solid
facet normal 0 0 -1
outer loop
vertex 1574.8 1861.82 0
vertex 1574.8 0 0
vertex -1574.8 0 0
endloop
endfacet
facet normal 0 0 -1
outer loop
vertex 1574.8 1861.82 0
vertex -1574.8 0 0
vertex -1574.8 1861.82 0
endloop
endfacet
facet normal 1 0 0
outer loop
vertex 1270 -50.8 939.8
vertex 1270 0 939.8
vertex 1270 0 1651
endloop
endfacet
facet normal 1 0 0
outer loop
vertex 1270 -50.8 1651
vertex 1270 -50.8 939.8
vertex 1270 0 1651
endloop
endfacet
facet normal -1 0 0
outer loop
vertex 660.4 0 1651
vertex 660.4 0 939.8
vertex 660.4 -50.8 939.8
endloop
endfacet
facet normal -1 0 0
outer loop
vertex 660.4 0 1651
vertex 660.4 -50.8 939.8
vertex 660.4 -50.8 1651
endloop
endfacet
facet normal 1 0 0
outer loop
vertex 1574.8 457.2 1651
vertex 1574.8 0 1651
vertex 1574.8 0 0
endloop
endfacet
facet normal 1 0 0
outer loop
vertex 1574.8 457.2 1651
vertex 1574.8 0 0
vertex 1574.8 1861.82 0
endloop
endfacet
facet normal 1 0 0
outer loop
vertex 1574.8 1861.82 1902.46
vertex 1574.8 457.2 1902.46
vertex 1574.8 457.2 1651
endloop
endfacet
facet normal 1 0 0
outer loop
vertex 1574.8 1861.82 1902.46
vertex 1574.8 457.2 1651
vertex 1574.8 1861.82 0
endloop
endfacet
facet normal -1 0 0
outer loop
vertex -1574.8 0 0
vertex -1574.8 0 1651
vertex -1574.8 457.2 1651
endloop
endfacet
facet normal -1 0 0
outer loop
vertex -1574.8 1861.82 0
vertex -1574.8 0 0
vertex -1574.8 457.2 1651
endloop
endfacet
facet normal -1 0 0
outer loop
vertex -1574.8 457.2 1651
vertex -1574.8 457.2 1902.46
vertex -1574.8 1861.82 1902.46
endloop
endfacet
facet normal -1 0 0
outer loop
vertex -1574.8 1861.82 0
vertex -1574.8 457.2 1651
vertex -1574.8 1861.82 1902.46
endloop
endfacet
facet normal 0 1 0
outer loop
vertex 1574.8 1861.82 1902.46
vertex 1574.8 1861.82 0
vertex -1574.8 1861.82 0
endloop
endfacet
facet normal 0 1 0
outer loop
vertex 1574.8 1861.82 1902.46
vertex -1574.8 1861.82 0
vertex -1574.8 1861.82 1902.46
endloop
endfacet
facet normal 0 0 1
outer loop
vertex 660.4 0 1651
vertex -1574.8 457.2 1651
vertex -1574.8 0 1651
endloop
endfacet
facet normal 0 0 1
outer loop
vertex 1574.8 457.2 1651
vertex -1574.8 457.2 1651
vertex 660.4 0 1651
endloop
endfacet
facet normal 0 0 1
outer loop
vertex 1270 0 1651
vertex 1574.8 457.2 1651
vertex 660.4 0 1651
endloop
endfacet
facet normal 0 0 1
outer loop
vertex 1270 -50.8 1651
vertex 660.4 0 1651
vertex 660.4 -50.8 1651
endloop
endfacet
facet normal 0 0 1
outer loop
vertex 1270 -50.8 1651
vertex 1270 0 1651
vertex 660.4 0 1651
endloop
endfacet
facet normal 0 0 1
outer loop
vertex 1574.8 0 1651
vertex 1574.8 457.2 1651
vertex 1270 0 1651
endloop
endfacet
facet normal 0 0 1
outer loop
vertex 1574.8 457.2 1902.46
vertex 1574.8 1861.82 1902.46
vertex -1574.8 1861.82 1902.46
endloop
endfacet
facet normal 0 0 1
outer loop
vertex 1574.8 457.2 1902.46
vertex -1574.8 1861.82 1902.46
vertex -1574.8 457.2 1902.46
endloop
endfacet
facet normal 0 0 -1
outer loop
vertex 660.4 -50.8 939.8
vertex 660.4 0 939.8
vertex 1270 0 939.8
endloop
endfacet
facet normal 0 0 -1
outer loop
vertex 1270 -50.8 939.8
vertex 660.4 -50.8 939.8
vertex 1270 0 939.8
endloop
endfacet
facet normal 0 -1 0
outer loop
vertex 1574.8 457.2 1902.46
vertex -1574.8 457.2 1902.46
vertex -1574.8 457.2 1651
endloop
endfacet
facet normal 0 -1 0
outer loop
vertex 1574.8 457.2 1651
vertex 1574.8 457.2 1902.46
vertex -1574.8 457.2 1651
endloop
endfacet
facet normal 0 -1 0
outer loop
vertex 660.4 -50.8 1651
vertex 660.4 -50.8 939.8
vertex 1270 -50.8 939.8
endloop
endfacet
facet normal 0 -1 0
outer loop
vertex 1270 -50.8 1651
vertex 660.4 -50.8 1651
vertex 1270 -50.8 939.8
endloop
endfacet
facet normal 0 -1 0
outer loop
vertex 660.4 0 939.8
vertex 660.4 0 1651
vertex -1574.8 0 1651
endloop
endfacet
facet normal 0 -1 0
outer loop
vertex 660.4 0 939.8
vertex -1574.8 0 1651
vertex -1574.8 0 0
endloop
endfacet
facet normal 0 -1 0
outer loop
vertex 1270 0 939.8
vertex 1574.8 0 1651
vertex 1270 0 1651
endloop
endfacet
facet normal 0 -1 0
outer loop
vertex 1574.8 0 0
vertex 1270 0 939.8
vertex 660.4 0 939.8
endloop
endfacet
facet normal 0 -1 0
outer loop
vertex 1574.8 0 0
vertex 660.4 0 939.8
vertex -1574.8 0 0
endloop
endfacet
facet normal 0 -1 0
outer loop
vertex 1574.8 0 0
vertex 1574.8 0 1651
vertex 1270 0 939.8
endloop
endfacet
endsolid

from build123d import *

# Parameters (mm, degrees)
F1_DEPTH = 1574.8
F2_W     = 609.6
F2_H     = 711.2
F3_DEPTH = 50.8


with BuildPart() as f1:
    # F0 (on Right) → F1 (new body, symmetric)
    with BuildSketch(Plane.YZ):
        Polygon((0, 1651), (0, 0), (1861.82, 0), (1861.82, 1902.46), (457.2, 1902.46), (457.2, 1651), align=None)
    extrude(amount=F1_DEPTH, both=True)

    # F2 (on face) → F3 (join)
    with BuildSketch(Plane.XZ):
        with Locations((965.2, 1295.4)):
            Rectangle(F2_W, F2_H)
    extrude(amount=F3_DEPTH)


solid = f1.part
